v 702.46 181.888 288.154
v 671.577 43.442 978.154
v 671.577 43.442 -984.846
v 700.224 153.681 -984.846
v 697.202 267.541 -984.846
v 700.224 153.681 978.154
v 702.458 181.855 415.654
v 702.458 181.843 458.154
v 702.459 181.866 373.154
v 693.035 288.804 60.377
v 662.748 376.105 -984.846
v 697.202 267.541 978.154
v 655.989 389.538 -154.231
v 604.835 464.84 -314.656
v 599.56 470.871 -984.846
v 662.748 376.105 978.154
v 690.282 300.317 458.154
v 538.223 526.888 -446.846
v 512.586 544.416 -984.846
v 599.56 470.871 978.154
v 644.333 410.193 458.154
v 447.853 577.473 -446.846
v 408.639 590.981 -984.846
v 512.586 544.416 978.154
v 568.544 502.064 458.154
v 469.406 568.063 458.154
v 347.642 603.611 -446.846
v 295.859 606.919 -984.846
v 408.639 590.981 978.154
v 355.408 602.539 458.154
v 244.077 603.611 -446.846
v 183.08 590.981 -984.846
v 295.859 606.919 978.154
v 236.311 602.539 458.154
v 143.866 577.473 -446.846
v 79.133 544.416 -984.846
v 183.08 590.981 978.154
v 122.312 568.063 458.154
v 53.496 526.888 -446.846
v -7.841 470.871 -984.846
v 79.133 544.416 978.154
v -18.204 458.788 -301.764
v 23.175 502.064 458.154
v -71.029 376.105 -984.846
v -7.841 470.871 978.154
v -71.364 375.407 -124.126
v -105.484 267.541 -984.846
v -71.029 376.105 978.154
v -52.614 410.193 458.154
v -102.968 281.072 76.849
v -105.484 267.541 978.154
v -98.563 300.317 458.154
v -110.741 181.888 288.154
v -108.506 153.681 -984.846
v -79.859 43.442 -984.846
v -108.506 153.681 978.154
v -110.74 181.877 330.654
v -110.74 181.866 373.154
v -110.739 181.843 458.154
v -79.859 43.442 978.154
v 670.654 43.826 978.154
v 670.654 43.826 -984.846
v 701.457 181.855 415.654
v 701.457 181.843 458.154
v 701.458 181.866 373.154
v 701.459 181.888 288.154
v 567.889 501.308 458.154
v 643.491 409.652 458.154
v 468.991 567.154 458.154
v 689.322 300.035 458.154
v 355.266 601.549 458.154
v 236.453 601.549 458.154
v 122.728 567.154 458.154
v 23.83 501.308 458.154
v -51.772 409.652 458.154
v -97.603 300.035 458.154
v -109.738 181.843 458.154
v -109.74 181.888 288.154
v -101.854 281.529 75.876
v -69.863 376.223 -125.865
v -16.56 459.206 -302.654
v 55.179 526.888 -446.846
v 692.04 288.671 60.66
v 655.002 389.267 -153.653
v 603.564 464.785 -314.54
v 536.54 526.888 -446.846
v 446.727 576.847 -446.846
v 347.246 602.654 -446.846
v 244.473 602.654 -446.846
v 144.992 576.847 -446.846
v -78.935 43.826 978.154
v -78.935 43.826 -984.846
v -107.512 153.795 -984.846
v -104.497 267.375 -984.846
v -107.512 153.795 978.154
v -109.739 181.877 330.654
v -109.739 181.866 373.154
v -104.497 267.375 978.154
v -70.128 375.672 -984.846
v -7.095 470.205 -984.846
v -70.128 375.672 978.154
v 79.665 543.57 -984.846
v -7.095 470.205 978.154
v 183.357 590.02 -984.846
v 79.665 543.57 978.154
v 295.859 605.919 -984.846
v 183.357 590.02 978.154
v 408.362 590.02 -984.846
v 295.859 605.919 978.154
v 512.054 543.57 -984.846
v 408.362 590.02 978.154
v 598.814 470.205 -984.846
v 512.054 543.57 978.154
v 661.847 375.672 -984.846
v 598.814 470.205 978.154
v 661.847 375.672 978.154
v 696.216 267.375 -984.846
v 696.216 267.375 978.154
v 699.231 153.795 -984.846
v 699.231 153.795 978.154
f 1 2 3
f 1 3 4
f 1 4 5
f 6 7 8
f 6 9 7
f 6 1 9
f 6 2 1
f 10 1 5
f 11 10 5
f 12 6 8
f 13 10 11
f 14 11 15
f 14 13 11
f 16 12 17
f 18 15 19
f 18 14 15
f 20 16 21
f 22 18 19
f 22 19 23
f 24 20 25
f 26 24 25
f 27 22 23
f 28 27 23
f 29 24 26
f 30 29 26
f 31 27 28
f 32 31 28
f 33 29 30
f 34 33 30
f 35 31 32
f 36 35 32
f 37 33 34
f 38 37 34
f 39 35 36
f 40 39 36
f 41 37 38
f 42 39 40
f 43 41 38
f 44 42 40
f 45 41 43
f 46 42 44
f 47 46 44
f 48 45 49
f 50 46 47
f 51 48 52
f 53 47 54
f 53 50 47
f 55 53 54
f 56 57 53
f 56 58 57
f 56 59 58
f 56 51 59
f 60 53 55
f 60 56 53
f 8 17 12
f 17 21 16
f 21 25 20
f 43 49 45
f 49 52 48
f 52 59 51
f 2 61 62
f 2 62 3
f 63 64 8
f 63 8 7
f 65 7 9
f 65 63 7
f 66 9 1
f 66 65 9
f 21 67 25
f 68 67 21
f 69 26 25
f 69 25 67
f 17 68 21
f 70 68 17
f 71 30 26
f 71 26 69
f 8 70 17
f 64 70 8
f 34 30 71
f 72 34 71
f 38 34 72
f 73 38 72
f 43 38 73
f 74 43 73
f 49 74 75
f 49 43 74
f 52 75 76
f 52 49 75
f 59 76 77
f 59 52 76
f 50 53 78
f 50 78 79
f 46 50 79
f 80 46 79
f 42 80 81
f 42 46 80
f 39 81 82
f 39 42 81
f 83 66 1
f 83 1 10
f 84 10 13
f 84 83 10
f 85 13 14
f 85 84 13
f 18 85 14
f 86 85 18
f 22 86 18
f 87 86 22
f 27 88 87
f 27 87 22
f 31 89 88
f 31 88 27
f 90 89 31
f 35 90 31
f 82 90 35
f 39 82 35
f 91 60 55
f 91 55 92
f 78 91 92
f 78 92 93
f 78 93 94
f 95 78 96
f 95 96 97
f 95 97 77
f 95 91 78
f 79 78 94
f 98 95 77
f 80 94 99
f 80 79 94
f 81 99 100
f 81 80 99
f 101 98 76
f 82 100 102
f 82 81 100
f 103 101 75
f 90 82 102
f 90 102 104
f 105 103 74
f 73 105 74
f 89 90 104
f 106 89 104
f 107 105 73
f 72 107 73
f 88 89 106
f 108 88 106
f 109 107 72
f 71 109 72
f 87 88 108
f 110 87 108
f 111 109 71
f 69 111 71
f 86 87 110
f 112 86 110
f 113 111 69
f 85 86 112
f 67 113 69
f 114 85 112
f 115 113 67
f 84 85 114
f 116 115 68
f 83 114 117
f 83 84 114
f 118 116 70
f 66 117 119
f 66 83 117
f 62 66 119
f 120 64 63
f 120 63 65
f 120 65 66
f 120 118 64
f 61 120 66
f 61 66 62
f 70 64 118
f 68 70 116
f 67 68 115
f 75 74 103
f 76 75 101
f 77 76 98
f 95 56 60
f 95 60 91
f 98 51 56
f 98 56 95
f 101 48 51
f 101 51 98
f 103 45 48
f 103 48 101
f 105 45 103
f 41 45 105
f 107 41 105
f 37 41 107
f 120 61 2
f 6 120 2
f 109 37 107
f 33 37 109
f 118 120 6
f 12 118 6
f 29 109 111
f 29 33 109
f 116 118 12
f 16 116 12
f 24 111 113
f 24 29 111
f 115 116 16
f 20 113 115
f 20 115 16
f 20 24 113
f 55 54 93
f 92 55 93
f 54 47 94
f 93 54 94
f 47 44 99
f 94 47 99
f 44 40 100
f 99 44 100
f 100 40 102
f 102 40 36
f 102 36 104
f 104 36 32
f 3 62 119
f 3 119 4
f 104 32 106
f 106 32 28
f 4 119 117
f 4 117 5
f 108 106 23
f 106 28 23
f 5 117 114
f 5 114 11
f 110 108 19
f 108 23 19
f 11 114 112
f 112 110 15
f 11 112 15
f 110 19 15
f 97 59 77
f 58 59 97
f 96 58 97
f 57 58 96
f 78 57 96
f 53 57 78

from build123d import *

# Parameters (mm, degrees)
SM_BASE_FLANGE_1_DEPTH   = 1963
CUT_EXTRUDE_1_DEPTH      = 2056.095688695
CUT_EXTRUDE_1_DEPTH_BACK = 2056.095688695


# Sheet-metal steps are written as plain solids
with BuildPart() as part:
    # Sketch 1 → Базовая кромка1 (new body)
    with BuildSketch(Plane.XY.offset(978.154266119)):
        with BuildLine():
            ThreePointArc((-78.935450432, 43.826476967), (295.859427587, 605.918755478), (670.654305605, 43.826476967))
            Line((670.654305605, 43.826476967), (671.577445699, 43.442013227))
            ThreePointArc((671.577445699, 43.442013227), (295.859427587, 606.918755478), (-79.858590526, 43.442013227))
            Line((-79.858590526, 43.442013227), (-78.935450432, 43.826476967))
        make_face()
    extrude(amount=-SM_BASE_FLANGE_1_DEPTH)

    # Эскиз6 → Вырез-Вытянуть1 (cut, two sides: drawn at the far end of the back side and taken through both)
    with BuildSketch(Plane(origin=(295.859427587, 199.918755478, 988), x_dir=(0, 0, -1), z_dir=(1, 0, 0)).offset(-CUT_EXTRUDE_1_DEPTH_BACK)):
        Polygon((529.845733881, 406.969134819), (529.845733881, -18.075276179), (699.845733881, -18.030865181), (1434.845733881, 326.969134819), (1434.845733881, 406.969134819), (1434.845733881, 592.56230864), (529.845733881, 592.56230864), align=None)
    extrude(amount=CUT_EXTRUDE_1_DEPTH + CUT_EXTRUDE_1_DEPTH_BACK, mode=Mode.SUBTRACT)


solid = part.part
